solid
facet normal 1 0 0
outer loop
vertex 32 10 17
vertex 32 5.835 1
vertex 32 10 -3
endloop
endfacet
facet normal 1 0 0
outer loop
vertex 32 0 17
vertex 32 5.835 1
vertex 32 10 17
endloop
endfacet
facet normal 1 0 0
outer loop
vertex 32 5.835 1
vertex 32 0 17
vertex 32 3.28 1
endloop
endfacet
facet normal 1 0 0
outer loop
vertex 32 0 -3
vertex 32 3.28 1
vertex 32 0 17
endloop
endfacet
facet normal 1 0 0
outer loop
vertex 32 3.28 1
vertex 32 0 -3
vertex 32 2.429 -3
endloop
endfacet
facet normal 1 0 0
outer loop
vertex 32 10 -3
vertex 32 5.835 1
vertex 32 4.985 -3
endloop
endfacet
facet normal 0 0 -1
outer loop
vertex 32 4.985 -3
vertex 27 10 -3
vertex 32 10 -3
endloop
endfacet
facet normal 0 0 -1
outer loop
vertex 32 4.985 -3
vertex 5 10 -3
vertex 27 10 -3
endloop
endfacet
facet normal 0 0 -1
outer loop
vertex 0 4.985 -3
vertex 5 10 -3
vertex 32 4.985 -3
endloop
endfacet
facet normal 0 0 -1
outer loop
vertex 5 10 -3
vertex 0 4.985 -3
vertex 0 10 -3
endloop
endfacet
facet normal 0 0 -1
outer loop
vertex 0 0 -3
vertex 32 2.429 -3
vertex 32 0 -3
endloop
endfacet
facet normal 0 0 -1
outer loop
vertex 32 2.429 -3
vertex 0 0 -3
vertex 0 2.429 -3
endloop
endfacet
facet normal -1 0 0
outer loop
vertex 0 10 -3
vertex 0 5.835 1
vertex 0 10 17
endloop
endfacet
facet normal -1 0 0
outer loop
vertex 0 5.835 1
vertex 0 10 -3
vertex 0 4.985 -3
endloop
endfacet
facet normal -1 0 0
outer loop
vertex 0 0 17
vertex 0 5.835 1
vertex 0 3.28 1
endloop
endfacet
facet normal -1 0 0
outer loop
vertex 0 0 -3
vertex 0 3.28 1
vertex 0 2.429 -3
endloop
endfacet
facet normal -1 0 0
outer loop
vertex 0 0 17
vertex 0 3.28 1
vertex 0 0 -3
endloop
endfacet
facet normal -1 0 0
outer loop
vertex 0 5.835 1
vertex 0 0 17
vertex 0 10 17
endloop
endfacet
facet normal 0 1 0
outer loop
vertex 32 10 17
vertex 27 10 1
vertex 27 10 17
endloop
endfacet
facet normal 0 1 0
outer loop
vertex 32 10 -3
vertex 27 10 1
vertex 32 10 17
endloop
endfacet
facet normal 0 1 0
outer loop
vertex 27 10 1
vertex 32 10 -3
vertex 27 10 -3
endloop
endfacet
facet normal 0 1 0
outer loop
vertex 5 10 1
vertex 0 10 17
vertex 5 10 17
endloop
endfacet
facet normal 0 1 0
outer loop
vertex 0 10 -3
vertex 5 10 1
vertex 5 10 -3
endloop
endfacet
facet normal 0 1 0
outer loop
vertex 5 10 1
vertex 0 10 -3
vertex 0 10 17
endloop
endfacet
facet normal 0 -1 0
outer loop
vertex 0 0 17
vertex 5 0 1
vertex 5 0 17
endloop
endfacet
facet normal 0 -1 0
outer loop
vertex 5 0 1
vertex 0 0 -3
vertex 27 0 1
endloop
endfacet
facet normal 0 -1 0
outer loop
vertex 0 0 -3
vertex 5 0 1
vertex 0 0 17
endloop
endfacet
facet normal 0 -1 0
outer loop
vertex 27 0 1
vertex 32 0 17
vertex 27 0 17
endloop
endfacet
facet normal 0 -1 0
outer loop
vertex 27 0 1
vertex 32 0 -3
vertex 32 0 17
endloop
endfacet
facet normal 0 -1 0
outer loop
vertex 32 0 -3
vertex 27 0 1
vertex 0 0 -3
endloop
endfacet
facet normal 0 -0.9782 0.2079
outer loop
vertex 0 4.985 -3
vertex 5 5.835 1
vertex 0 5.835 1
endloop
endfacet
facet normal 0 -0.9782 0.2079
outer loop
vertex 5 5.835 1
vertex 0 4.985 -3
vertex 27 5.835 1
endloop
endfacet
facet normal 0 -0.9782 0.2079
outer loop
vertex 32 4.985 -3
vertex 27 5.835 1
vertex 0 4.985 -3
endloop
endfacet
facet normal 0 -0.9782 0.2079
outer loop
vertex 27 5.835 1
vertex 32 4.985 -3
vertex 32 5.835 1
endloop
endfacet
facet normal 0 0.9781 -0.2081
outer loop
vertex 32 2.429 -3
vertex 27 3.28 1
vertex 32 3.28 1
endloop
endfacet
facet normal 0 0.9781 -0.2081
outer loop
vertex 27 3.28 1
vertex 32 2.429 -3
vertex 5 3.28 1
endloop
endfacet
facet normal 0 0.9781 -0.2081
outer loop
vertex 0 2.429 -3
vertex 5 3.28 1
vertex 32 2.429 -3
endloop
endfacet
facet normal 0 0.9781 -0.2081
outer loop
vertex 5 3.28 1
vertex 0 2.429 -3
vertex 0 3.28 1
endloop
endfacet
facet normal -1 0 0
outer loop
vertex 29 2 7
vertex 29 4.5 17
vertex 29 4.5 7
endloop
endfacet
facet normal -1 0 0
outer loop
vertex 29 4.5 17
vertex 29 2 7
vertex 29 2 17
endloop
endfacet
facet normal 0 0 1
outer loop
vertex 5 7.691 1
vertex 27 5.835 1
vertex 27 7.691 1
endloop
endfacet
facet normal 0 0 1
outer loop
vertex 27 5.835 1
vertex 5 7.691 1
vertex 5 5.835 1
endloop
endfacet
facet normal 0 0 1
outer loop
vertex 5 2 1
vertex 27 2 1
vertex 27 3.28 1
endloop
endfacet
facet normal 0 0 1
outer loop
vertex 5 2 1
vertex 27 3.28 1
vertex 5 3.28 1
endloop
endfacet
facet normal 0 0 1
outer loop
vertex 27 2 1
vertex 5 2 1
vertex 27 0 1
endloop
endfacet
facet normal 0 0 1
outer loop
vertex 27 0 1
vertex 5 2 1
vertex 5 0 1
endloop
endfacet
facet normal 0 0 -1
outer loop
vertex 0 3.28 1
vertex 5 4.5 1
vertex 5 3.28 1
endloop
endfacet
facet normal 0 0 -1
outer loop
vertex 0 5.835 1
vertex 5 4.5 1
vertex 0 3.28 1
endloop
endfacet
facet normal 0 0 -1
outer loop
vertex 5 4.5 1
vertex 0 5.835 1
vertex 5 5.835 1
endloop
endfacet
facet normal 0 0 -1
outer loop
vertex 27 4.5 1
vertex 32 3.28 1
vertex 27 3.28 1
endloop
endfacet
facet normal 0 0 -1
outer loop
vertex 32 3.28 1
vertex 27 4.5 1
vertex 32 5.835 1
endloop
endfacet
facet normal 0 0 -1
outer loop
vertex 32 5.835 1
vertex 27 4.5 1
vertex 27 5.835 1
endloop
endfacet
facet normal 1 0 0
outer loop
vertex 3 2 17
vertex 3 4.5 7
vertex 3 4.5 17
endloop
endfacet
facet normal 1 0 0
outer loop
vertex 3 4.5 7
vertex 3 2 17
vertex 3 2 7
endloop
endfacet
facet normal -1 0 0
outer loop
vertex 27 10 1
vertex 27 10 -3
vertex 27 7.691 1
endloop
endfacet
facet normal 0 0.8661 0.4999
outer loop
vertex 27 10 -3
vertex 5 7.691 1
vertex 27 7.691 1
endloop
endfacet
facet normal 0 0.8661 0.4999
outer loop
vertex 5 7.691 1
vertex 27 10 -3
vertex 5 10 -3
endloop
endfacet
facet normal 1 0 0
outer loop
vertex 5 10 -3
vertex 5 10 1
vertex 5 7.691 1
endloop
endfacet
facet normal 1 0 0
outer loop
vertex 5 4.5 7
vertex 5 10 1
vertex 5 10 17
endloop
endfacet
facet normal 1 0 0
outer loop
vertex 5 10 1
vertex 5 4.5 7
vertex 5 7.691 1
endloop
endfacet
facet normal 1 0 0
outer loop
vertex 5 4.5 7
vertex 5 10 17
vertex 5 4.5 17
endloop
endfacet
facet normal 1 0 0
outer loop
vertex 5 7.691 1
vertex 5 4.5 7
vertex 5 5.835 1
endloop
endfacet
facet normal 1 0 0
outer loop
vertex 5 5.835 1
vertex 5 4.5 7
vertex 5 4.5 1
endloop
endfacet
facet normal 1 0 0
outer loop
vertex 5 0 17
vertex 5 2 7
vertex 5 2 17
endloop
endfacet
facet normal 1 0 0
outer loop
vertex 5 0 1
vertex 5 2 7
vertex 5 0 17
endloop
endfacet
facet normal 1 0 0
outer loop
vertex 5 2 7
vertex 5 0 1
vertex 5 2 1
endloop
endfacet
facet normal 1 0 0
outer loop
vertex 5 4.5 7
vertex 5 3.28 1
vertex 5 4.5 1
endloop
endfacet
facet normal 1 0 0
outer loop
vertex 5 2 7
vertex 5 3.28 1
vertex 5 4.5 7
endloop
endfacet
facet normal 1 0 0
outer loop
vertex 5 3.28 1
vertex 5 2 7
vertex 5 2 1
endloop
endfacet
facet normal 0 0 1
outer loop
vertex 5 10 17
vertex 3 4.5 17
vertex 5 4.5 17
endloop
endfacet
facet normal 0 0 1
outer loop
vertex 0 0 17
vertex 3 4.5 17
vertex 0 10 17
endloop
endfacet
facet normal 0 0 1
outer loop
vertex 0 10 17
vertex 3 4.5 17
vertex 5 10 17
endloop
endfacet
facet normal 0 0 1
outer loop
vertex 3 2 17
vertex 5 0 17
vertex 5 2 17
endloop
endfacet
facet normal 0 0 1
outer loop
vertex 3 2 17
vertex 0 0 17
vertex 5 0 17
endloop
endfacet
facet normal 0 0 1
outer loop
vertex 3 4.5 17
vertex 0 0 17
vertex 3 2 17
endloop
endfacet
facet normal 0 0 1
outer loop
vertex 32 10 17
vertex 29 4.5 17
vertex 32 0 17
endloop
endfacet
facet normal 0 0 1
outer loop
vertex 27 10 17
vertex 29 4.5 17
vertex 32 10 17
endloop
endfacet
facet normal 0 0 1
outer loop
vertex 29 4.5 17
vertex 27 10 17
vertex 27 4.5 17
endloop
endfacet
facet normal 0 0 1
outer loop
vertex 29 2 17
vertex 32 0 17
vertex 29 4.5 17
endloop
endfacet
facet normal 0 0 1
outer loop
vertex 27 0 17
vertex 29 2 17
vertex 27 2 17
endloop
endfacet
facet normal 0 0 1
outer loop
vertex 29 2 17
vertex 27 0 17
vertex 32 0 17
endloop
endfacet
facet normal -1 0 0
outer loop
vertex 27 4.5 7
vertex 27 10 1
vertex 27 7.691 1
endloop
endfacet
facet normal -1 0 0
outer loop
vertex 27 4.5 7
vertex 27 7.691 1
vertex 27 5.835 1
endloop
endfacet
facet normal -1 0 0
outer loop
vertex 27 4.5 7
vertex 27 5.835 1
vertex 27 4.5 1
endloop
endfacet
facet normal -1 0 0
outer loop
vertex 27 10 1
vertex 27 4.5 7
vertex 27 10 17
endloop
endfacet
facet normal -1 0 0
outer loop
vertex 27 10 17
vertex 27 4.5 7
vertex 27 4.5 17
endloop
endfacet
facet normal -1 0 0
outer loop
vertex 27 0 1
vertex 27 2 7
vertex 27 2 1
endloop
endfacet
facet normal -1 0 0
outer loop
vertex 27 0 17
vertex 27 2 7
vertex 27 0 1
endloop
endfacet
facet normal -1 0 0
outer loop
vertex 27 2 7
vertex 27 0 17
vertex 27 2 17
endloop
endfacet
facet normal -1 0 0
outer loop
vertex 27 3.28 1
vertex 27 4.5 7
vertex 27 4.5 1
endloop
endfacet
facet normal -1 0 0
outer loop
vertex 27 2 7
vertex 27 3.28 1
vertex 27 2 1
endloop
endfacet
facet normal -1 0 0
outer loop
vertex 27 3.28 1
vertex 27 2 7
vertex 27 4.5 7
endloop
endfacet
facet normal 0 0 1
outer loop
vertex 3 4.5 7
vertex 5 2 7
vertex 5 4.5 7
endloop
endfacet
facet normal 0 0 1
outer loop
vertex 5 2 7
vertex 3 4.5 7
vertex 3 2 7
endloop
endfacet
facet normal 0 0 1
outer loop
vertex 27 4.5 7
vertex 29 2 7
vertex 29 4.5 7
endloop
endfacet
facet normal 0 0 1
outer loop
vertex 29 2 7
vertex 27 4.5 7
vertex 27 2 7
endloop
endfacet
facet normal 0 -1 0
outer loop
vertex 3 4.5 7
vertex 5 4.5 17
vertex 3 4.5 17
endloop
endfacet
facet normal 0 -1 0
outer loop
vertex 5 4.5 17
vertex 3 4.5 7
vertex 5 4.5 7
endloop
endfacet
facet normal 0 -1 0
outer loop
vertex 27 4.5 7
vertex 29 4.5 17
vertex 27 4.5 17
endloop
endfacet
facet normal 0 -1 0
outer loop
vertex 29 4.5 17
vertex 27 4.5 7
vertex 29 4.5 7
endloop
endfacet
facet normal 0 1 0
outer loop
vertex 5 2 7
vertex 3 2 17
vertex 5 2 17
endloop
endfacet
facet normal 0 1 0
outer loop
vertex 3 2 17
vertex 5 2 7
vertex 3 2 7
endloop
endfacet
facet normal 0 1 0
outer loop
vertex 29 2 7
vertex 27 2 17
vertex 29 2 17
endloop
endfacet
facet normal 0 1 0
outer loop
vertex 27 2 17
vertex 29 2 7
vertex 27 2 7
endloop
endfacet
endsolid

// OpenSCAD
// STAND PARTS OLD
*difference(){
    cube([10,60,10]);
    translate([-1,3,3]) cube([12,2,9]);
    translate([3,10,-1]) cube([4,45,12]);
}

// AJASTER BLOCK
*difference(){
    cube([20,20,28]);
    translate([2.5,-1,4]) cube([15,22,20]);
}

// STAND PARTS
*union(){
    difference(){
        cube([10,60,10]);
        rotate([-12,0,0]) translate([-1,3,3]) cube([12,2,9]);
        translate([3,10,-1]) cube([4,45,12]);
    }
    translate([-1,0,0]) cube([1,60,10]);
    translate([10,0,0]) cube([1,60,10]);
}

// BARCODE READER HOLDER
*union(){
    difference(){
        translate([0,0,-3]) cube([36,20,13]);
        rotate([-12,0,0]) translate([-1,3,-5]) cube([39,2.5,25]);
        translate([3,10,-4]) cube([4,8,18]);
        translate([11,10,-4]) cube([26,11,15]);
        translate([11,-1,1]) cube([22,12,15]);
        translate([7.8,10,1]) cube([20,12,2]);
    }
    translate([-1,0,-3]) cube([1,20,13]);
    translate([10,0,0]) cube([1,10,10]);
    translate([33,0,0]) cube([3,10,10]);
}

// TABLE SOCKS
*union(){
    cube([10,13,2], center=true);
    difference(){
        translate([0,-7.5,8]) cube([10,2,18], center=true);
        translate([0,-7.26,9.5]) hull(){
            cube([8,0.1,12], center=true);
            translate([0,-1.2,0]) cube([9,0.1,14], center=true);
        }
    }
    difference(){
        translate([0,7.5,8]) cube([10,2,18], center=true);
        translate([0,7.26,9.5]) hull(){
            cube([8,0.1,12], center=true);
            translate([0,1.2,0]) cube([9,0.1,14], center=true);
        }
    }
}

// CAMERA OLD
*union(){
    union(){
        difference(){
            translate([0,0,-3]) cube([32,10,10]);
            rotate([-12,0,0]) translate([-1,3,-5]) cube([39,2.5,25]);
            translate([3,-1,1]) cube([26,12,15]);
        }
        difference(){
            union(){
                translate([0,0,1]) cube([5,10,6]);
                translate([27,0,1]) cube([5,10,6]);
            }
            rotate([0,0,0]) translate([3,2,-5]) cube([26,2.5,25]);
        }
    }
}

// CAMERA
union(){
    union(){
        difference(){
            // MAIN BOX
            translate([0,0,-3]) cube([32,10,18]);
            // MIZO
            rotate([-12,0,0]) translate([-1,3,-5]) cube([39,2.5,10]);
            // MAIN SPACE
            translate([3,-1,1]) cube([26,12,15]);
            translate([5,10,1]) rotate([0,90,0]) cylinder(h=22, r=4, center=false, $fn=3);
        }
        difference(){
            union(){
                translate([0,0,1]) cube([5,10,16]);
                translate([27,0,1]) cube([5,10,16]);
            }
            rotate([0,0,0]) translate([5,2,-5]) cube([22,2.5,12]);
            rotate([0,0,0]) translate([3,2,7]) cube([26,2.5,13]);
        }
    }
}
